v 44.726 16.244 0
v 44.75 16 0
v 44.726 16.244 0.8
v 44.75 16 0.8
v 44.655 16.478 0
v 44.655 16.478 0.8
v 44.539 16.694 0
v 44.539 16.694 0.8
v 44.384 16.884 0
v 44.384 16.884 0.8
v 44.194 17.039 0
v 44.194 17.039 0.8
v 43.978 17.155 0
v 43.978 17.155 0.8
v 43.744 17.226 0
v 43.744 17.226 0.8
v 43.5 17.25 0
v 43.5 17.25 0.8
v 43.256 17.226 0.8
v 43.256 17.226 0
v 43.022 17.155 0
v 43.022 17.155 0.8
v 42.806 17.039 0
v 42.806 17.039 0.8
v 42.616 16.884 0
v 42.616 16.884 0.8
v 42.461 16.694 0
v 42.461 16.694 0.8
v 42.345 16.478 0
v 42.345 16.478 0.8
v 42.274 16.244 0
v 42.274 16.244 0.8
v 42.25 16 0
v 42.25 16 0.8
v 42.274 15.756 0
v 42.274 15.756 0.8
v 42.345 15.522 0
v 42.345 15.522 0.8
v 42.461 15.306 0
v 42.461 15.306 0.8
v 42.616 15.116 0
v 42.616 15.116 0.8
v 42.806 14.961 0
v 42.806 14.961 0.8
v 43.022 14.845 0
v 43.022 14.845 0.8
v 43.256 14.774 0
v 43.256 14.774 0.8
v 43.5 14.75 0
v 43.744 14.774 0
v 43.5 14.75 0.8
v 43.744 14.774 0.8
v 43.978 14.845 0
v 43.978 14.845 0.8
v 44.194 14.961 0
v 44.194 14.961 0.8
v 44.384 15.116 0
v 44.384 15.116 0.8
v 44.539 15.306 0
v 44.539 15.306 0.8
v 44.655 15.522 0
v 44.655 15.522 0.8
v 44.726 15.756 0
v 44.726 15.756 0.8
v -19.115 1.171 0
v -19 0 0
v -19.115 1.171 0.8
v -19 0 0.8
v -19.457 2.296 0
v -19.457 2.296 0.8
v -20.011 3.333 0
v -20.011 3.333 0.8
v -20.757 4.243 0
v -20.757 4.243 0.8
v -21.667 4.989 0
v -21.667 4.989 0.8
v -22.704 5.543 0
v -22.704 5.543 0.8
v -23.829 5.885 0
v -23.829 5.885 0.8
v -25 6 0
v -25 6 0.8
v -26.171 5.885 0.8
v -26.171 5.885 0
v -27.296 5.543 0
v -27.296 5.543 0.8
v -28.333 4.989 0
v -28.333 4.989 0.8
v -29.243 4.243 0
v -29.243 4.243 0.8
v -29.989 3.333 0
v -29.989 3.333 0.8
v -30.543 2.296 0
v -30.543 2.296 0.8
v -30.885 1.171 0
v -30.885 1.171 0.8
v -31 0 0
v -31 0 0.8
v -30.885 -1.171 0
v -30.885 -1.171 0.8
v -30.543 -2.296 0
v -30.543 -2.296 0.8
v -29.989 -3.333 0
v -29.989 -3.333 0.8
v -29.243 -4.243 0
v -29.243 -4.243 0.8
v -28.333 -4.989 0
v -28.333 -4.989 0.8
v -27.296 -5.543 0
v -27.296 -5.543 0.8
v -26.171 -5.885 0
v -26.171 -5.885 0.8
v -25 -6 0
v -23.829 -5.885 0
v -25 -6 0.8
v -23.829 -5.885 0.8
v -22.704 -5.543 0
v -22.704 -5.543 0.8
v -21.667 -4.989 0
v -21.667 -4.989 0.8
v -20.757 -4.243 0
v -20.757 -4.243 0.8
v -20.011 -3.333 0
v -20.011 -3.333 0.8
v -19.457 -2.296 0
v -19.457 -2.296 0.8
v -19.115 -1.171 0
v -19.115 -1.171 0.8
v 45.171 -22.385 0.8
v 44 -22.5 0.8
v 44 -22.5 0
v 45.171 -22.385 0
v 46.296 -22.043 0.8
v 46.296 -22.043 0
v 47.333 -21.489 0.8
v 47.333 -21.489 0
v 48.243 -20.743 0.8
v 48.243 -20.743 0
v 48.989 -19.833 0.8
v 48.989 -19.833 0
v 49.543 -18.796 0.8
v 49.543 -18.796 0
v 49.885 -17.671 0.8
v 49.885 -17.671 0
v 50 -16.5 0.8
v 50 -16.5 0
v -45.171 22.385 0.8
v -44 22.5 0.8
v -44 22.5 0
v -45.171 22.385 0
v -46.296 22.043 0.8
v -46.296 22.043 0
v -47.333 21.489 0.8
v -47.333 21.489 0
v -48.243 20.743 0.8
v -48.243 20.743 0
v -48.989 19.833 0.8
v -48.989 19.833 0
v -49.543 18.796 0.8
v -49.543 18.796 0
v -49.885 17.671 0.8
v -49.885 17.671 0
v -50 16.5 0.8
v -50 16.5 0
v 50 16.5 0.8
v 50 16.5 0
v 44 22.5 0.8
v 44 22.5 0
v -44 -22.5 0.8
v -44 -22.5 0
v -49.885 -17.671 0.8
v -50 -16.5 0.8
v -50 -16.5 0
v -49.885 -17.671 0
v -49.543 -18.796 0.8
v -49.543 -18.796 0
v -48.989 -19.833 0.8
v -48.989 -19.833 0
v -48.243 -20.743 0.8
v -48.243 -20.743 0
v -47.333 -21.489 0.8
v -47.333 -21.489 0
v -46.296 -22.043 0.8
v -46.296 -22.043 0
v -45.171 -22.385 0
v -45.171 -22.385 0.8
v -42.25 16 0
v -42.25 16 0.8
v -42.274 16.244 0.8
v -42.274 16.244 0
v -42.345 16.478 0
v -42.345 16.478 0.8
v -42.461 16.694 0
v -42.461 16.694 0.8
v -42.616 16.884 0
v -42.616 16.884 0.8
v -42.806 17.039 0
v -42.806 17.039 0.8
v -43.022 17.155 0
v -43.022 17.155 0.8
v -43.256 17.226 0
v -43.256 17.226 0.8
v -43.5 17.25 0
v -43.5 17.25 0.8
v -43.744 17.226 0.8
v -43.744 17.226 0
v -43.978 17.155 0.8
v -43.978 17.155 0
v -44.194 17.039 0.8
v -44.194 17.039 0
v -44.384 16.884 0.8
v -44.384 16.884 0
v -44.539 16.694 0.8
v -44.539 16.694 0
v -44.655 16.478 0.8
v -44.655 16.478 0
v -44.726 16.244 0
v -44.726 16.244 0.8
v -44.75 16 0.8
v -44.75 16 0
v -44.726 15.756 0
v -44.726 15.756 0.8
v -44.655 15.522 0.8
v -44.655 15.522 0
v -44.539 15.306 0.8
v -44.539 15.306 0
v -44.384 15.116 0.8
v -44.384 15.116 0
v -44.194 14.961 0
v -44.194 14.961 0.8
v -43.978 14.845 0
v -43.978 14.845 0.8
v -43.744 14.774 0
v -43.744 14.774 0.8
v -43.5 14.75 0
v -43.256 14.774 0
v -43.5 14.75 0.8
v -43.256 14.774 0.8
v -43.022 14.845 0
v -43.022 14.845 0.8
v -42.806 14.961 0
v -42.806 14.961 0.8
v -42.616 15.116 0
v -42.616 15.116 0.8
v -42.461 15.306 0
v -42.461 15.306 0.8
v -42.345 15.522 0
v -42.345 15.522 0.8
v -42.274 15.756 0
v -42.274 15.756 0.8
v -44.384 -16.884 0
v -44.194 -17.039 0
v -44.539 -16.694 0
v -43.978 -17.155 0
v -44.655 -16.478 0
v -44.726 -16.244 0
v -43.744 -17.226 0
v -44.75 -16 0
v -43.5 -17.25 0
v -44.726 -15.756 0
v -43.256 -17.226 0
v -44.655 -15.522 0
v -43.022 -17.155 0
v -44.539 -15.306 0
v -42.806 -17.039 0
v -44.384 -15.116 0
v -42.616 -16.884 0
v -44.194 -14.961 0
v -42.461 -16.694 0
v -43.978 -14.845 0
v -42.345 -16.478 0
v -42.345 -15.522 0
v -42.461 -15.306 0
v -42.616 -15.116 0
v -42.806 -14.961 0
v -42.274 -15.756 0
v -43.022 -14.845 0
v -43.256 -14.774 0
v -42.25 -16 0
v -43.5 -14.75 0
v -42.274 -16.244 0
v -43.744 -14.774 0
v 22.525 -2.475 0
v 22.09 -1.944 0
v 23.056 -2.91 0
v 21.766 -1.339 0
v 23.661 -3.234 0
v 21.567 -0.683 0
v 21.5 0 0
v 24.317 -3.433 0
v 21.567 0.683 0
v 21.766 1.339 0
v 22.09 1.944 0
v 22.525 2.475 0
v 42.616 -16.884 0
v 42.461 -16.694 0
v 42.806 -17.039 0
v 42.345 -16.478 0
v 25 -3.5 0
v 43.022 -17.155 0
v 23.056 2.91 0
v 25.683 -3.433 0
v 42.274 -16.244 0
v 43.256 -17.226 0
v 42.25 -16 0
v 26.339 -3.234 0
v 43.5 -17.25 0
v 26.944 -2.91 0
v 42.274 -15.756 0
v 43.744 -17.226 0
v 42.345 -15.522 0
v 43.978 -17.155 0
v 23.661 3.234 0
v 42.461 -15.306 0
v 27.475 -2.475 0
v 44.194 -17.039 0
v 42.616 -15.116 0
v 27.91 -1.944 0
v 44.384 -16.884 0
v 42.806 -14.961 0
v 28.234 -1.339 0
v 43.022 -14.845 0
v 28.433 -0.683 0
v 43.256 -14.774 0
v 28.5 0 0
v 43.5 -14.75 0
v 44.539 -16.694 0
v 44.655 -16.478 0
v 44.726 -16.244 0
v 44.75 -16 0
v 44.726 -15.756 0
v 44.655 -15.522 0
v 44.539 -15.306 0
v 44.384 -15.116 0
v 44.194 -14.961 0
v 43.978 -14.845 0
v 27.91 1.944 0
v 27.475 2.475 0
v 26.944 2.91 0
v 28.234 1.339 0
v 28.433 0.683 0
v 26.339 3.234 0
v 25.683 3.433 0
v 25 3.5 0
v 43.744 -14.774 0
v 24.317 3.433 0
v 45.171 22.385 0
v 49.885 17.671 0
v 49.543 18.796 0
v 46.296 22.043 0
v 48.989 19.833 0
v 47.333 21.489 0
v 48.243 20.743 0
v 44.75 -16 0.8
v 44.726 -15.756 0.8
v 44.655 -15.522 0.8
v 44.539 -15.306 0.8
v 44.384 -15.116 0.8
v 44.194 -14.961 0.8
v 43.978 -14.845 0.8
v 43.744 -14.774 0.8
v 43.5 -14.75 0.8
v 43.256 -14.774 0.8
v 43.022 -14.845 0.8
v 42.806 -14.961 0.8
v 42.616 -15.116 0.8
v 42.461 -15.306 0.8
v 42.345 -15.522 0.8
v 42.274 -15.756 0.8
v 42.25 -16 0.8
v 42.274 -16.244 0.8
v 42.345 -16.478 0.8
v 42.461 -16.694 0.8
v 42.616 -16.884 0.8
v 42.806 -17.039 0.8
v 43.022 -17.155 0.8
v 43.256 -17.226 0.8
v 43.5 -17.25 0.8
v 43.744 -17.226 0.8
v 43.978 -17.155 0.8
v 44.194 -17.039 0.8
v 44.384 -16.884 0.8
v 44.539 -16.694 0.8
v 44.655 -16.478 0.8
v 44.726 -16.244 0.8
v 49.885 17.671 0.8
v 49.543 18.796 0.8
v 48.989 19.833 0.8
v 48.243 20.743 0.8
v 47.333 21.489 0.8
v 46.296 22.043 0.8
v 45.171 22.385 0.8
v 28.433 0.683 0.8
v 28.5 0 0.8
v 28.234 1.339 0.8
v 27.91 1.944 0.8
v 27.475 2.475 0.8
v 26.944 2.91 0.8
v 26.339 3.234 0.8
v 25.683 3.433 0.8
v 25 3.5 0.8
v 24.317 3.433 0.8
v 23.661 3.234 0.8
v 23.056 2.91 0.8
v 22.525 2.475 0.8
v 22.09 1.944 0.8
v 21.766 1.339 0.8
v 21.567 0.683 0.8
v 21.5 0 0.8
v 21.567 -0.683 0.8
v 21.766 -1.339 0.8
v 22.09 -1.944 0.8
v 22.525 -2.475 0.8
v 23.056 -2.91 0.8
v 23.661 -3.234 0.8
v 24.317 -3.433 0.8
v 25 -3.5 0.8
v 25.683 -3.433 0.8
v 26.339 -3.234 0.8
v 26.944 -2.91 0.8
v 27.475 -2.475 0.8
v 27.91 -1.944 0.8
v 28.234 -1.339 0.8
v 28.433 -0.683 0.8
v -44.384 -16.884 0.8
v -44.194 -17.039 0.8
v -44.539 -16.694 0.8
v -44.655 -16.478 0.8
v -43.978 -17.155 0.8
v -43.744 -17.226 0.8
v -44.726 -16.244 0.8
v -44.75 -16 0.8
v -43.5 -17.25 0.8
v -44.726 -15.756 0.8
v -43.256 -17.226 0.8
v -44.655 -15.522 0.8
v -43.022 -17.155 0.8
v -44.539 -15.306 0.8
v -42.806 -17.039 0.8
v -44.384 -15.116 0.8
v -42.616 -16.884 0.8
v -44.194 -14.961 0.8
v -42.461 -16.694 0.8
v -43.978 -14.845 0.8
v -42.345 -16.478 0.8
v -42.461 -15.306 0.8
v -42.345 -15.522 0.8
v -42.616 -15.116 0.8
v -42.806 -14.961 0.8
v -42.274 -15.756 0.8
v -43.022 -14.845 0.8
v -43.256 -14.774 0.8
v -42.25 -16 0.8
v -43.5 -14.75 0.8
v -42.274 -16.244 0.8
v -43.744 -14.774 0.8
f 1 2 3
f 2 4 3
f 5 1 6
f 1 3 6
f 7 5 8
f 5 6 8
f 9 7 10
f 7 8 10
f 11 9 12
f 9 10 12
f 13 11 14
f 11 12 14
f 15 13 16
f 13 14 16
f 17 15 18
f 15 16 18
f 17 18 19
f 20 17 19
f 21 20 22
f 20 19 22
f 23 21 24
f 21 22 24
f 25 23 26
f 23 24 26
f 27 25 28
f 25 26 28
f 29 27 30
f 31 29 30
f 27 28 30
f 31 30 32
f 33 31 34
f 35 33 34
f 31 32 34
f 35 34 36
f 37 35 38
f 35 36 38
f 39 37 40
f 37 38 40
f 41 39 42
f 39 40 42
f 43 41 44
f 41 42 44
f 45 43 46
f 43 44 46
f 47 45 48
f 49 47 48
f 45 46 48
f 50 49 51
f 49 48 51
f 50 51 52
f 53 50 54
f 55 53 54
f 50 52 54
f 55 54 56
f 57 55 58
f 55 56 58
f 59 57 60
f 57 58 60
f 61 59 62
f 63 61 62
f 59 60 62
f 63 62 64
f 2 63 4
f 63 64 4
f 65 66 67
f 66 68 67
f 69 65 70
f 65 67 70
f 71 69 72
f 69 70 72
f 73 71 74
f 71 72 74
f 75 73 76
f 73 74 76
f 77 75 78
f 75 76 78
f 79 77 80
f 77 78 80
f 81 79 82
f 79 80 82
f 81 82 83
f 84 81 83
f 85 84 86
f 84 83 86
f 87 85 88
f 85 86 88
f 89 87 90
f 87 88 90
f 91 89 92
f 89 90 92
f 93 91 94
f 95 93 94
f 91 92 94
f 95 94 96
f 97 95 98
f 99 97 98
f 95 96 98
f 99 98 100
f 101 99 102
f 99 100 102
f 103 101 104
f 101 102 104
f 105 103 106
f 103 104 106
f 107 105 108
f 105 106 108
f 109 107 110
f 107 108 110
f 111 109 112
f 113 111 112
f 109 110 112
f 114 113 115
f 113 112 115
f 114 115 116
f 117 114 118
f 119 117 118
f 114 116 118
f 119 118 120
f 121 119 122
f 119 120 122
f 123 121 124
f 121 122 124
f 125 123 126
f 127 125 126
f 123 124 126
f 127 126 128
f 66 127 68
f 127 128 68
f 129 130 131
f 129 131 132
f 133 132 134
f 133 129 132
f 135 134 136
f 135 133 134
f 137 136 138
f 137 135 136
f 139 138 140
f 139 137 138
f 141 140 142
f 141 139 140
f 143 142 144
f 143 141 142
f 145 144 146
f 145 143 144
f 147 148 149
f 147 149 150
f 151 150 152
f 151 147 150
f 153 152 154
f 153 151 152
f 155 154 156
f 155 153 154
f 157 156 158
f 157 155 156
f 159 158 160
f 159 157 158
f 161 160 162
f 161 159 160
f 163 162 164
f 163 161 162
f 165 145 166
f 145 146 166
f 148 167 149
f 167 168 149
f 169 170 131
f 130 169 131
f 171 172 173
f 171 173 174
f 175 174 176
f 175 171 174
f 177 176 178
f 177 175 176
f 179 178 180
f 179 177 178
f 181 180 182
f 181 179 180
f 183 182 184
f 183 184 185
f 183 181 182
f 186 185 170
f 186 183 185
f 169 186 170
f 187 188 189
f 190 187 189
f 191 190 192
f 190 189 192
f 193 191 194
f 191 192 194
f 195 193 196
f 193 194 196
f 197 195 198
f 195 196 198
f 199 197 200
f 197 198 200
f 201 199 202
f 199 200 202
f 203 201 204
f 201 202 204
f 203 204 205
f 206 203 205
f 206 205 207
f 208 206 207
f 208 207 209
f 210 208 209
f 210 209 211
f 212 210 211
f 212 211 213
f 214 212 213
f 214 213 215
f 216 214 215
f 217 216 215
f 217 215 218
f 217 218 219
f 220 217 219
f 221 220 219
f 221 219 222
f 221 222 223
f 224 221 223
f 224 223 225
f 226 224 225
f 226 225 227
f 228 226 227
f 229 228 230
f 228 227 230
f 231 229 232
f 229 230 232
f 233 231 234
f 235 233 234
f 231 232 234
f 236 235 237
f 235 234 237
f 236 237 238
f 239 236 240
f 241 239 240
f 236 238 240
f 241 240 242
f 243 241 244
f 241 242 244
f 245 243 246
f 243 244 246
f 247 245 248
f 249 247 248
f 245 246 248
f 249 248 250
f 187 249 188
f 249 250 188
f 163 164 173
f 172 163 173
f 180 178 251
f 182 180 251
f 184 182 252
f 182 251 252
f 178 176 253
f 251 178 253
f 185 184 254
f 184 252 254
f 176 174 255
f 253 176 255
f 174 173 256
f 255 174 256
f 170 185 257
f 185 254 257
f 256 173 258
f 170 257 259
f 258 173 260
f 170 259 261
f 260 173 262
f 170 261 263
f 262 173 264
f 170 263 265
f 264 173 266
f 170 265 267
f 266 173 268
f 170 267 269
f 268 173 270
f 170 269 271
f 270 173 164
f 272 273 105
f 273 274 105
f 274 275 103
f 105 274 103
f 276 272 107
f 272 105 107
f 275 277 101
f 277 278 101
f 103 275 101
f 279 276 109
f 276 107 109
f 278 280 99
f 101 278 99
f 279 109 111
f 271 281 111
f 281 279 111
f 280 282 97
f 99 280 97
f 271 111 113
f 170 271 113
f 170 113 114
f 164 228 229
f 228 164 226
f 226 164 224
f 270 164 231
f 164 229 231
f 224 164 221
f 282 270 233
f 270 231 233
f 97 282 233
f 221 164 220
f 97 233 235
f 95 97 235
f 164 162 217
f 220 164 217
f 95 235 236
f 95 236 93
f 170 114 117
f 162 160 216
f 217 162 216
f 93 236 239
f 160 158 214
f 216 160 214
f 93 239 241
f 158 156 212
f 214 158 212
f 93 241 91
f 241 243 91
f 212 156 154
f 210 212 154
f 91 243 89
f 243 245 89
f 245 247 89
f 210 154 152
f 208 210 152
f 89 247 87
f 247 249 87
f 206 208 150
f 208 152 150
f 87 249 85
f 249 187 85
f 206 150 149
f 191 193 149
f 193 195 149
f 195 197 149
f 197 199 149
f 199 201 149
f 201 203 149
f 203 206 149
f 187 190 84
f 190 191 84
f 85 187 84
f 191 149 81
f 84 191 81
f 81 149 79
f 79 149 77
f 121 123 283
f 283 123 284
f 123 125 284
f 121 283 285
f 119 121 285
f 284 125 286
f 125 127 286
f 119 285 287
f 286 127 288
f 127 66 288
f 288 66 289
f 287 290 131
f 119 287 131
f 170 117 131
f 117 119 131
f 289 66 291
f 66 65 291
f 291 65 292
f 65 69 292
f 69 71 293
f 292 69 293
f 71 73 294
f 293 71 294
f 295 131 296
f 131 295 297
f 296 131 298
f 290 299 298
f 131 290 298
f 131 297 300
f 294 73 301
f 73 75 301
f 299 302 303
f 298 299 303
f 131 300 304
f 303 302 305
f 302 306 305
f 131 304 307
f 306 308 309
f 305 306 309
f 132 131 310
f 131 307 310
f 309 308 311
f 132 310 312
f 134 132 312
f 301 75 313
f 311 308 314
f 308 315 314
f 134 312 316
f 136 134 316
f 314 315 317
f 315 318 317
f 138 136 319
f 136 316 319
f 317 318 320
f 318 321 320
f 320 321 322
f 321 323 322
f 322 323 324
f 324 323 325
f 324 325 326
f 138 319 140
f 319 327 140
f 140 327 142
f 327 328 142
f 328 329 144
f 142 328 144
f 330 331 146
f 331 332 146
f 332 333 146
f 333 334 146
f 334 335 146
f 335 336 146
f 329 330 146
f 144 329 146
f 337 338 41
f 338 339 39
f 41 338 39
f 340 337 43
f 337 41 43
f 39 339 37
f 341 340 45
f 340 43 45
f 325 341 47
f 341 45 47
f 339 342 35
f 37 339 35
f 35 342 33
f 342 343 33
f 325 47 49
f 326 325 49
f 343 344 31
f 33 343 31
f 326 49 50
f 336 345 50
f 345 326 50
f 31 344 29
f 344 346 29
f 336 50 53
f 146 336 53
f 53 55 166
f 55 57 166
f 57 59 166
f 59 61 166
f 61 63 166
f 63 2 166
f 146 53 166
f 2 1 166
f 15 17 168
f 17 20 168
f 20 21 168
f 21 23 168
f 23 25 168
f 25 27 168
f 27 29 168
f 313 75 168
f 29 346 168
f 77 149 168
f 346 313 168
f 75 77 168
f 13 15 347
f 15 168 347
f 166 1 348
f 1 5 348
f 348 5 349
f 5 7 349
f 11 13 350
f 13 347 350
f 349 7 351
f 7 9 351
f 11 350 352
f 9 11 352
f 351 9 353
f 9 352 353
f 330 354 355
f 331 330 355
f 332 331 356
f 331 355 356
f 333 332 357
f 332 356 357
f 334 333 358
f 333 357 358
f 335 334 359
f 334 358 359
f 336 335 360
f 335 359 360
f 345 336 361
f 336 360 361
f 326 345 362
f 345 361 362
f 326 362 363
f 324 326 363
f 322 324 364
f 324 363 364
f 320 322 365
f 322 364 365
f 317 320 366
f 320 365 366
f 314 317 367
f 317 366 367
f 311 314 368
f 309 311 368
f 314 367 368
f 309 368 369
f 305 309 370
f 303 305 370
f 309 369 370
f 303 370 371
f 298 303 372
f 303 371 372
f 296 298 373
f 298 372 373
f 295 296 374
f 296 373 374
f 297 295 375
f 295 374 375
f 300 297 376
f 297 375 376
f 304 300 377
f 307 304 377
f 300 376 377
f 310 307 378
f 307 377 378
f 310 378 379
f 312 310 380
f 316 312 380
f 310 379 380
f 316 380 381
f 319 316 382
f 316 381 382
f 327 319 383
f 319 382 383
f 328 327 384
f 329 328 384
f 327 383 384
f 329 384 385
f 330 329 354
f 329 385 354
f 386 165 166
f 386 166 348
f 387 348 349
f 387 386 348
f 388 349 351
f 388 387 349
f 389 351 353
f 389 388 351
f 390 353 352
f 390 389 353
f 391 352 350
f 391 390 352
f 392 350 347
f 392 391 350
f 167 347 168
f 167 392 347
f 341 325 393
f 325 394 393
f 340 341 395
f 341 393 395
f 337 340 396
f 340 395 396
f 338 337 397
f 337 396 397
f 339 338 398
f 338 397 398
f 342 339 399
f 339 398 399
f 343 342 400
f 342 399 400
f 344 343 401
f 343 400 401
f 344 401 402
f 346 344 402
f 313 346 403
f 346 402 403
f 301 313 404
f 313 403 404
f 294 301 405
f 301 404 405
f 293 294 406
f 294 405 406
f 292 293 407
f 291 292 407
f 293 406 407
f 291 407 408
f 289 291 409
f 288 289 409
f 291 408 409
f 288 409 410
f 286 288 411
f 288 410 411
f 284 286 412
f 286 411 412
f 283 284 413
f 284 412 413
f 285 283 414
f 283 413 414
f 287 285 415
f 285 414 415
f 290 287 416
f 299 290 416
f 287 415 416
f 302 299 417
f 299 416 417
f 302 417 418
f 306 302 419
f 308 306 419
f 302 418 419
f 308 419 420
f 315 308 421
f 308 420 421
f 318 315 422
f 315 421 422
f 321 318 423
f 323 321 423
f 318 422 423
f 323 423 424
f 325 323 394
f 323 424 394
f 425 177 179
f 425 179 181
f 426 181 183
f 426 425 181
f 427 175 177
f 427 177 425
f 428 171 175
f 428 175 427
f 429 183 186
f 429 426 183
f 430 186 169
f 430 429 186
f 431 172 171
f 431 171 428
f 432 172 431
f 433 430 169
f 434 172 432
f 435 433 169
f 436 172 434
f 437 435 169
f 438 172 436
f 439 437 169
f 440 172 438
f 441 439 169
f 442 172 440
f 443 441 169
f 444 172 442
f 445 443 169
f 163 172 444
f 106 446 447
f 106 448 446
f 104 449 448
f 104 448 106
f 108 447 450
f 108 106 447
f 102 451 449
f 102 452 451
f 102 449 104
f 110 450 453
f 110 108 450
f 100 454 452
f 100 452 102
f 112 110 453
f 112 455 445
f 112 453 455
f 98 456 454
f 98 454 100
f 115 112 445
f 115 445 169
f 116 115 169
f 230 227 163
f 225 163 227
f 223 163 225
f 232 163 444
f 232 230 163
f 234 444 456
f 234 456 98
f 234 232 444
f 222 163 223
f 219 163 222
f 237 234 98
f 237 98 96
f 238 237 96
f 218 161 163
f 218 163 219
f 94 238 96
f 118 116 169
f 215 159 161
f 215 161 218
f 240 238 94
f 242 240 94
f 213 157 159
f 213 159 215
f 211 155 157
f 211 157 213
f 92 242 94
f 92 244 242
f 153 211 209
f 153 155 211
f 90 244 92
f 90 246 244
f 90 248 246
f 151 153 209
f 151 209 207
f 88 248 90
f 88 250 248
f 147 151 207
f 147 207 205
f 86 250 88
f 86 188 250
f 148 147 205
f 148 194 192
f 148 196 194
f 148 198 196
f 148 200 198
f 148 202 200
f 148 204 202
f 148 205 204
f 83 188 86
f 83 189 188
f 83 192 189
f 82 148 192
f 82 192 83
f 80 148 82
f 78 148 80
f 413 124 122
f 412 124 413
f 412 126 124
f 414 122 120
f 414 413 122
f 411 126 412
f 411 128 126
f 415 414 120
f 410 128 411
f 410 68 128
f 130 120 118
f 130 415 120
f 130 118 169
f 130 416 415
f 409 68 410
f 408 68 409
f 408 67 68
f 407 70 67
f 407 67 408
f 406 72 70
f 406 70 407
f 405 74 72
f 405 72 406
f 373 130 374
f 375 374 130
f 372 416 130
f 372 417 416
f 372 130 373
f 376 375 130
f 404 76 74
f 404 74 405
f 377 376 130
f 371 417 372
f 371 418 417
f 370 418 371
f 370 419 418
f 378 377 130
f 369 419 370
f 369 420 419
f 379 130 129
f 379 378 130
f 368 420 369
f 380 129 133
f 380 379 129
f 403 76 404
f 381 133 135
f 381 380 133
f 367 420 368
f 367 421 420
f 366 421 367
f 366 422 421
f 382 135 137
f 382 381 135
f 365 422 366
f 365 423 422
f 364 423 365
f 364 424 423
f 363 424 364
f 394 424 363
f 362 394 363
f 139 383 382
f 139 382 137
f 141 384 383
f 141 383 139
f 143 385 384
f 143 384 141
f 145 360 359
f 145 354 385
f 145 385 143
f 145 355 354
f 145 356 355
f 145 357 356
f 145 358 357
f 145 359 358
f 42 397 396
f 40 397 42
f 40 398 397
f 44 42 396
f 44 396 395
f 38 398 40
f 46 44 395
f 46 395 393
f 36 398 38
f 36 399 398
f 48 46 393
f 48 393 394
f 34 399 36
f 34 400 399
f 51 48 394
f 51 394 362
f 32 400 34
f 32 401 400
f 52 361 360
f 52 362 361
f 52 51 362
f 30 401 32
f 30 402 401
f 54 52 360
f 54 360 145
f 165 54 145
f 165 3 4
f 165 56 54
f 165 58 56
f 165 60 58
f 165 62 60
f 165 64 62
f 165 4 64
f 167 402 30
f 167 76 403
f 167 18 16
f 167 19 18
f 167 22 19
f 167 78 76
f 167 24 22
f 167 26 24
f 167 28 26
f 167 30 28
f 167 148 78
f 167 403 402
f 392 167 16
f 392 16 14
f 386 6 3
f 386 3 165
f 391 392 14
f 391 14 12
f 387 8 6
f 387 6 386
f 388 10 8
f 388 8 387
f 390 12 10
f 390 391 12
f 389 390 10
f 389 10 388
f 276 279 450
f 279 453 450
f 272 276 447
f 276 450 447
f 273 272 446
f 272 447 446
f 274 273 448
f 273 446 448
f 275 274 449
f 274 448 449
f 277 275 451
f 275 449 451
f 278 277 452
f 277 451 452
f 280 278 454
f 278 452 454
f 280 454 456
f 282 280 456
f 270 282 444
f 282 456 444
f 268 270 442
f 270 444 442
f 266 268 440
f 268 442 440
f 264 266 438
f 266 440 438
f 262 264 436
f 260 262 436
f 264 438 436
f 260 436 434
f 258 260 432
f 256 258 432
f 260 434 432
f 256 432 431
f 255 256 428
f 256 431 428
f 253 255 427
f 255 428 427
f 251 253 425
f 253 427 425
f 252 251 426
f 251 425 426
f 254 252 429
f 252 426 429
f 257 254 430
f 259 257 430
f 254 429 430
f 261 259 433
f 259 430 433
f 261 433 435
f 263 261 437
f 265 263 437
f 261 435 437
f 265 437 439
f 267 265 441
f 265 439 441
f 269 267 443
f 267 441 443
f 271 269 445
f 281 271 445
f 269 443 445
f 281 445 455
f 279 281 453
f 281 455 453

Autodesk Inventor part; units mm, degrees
ref_plane "YZ Plane" through (0, 0, 0) normal (1, 0, 0) x (0, 1, 0)
ref_plane "XZ Plane" through (0, 0, 0) normal (0, 1, 0) x (-1, 0, 0)
ref_plane "XY Plane" through (0, 0, 0) normal (0, 0, 1) x (1, 0, 0)
sketch "Skizze2" plane through (0, 0, 0) normal (0, 0, 1) x (1, 0, 0)
  line L0 (-50, -22.5) -> (50, -22.5)
  line L1 (50, -22.5) -> (50, 22.5)
  line L2 (50, 22.5) -> (-50, 22.5)
  line L3 (-50, 22.5) -> (-50, -22.5)
  line L4 (-50, -22.5) -> (50, 22.5) construction
  line L5 (50, -22.5) -> (-50, 22.5) construction
  point P0 (0, 0)
  dimension "d0" = 100
  dimension "d1" = 45
extrude "Extrusion1" add sketch "Skizze2" along normal blind 0.8
fillet "Rundung1" radius 6 4 edges at (-50, 22.5, 0.4) (50, 22.5, 0.4) (50, -22.5, 0.4) (-50, -22.5, 0.4)
sketch "Skizze3" plane through (0, 0, 0.8) normal (0, 0, 1) x (1, 0, 0)
  line L0 (-50, 22.5) -> (50, 22.5) construction
  line L1 (50, 22.5) -> (50, -22.6939) construction
  line L2 (50, -22.6939) -> (-50, -22.6939) construction
  line L3 (-50, -22.6939) -> (-50, 22.5) construction
  line L4 (-50, 16.5) -> (-50, -16.5) projected
  line L5 (44, 22.5) -> (-44, 22.5) projected
  point P0 (0, 0)
  dimension "d6" = 100
decal "Aufkleber1"
sketch "Skizze4" plane through (0, 0, 0.8) normal (0, 0, 1) x (1, 0, 0)
  circle A0 centre (-25, 0) radius 6
  line L0 (44, 22.5) -> (-44, 22.5) projected
  line L1 (-50, 16.5) -> (-50, -16.5) projected
  circle A1 centre (25, 0) radius 3.5
  line L2 (50, -16.5) -> (50, 16.5) projected
  point P0 (0, 0)
  dimension "d10" = 22.5
  dimension "d11" = 25
  dimension "d12" = 12
  dimension "d15" = 25
  dimension "d16" = 7
extrude "Extrusion2" cut sketch "Skizze4" against normal through all
sketch "Skizze5" plane through (0, 0, 0.8) normal (0, 0, 1) x (1, 0, 0)
  circle A0 centre (-43.5, 16) radius 1.25
  circle A1 centre (43.5, 16) radius 1.25
  circle A2 centre (43.5, -16) radius 1.25
  circle A3 centre (-43.5, -16) radius 1.25
  line L0 (0, 31.5) -> (0, -31.5) construction
  line L1 (-71.1379, 0) -> (70.1897, 0) construction
  line L2 (44, 22.5) -> (-44, 22.5) construction
  line L3 (-50, 16.5) -> (-50, -16.5) construction
  point P0 (0, 0)
  dimension "d17" = 2.5
  dimension "d18" = 6.5
  dimension "d19" = 6.5
extrude "Extrusion3" cut sketch "Skizze5" against normal through all
properties part number "EW_MessingplatteBedienelemente" material "Messing"
